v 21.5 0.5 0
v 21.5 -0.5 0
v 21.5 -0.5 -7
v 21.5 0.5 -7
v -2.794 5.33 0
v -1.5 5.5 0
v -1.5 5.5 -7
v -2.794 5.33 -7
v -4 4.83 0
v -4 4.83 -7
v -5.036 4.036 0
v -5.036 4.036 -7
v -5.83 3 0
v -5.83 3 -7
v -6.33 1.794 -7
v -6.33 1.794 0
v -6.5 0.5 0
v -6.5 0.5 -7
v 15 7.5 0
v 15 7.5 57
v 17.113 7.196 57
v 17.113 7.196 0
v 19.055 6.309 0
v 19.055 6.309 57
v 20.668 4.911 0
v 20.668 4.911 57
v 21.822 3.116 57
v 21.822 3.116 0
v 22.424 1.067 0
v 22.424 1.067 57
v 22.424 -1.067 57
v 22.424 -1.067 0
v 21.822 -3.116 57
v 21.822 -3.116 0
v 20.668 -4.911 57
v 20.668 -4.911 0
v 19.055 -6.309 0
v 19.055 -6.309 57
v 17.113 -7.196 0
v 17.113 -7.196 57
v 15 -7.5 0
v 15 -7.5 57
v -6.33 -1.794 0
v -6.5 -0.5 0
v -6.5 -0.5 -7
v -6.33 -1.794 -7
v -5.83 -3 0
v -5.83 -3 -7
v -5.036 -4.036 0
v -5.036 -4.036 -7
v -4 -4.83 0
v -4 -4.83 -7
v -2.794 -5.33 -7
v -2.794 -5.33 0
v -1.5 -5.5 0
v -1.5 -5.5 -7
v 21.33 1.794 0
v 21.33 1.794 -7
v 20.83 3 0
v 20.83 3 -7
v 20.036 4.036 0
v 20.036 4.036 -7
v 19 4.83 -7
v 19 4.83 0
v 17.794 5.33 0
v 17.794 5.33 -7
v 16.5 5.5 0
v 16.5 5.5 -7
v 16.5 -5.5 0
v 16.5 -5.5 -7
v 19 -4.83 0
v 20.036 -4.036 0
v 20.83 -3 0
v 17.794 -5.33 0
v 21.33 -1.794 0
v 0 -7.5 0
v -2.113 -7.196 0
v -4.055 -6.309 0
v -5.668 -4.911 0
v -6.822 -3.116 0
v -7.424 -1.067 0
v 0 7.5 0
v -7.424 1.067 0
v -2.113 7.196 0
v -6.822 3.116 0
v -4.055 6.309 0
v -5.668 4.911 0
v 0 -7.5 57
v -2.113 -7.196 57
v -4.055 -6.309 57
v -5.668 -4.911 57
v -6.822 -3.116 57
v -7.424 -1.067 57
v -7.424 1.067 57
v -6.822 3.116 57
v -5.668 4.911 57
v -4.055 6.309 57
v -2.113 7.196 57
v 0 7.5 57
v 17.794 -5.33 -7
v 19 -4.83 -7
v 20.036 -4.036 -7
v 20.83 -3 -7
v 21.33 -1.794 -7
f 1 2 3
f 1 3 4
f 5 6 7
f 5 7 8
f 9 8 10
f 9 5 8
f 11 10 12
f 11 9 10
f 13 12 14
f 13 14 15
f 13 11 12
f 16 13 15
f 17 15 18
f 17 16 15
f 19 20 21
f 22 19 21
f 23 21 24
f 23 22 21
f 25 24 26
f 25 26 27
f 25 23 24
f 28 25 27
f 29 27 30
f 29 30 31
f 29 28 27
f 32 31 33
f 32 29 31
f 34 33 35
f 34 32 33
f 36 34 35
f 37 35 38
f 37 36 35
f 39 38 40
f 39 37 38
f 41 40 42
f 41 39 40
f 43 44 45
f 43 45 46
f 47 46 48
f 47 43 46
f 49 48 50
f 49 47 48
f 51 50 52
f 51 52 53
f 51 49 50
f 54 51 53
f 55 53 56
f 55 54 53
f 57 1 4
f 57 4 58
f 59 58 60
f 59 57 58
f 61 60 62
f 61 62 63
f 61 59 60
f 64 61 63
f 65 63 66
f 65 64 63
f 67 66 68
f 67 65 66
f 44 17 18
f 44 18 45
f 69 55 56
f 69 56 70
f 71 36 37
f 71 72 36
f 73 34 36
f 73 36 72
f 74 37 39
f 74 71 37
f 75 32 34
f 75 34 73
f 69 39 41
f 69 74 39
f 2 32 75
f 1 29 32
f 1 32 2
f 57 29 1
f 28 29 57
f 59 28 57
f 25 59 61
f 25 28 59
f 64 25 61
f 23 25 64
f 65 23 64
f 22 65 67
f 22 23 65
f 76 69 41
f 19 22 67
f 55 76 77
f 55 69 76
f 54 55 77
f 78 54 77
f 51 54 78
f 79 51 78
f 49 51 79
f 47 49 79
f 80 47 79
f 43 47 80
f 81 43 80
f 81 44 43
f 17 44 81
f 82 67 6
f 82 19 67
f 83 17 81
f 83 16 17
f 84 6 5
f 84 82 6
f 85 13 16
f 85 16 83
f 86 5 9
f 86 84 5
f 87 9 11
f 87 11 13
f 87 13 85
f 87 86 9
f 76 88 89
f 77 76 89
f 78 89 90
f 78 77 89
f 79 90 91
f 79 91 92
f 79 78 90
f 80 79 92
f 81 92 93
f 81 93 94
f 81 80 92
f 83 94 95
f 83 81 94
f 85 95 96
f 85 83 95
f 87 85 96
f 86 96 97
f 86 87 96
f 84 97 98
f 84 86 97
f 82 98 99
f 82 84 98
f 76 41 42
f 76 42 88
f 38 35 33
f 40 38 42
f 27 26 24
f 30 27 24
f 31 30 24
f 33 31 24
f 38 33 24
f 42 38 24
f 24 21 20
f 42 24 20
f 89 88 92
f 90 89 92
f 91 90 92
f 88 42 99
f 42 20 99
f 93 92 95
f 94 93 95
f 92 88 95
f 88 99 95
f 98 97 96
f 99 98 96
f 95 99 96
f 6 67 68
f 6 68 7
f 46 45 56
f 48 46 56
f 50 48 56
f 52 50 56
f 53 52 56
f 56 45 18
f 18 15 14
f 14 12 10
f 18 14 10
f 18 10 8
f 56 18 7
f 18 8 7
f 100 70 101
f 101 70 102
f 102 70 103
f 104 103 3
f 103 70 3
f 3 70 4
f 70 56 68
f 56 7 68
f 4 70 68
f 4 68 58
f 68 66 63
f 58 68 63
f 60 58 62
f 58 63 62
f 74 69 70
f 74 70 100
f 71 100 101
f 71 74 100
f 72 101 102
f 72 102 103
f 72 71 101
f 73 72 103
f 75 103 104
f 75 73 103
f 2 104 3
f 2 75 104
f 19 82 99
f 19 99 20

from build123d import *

# Parameters (mm, degrees)
BOSS_EXTRUDE1_DEPTH = 57
BOSS_EXTRUDE2_DEPTH = 7


with BuildPart() as part:
    # Sketch1 → Boss-Extrude1 (new body)
    with BuildSketch(Plane.XY):
        with BuildLine():
            Line((0, 7.5), (15, 7.5))
            ThreePointArc((15, 7.5), (22.5, 0), (15, -7.5))
            Line((15, -7.5), (0, -7.5))
            ThreePointArc((0, -7.5), (-7.5, 0), (0, 7.5))
        make_face()
    extrude(amount=BOSS_EXTRUDE1_DEPTH)

    # Sketch3 → Boss-Extrude2 (add)
    with BuildSketch(Plane(origin=(0, 0, 0), x_dir=(-1, 0, 0), z_dir=(0, 0, -1))):
        with BuildLine():
            Line((-16.5, 5.5), (1.5, 5.5))
            ThreePointArc((1.5, 5.5), (5.035533906, 4.035533906), (6.5, 0.5))
            Line((6.5, 0.5), (6.5, -0.5))
            ThreePointArc((6.5, -0.5), (5.035533906, -4.035533906), (1.5, -5.5))
            Line((1.5, -5.5), (-16.5, -5.5))
            ThreePointArc((-16.5, -5.5), (-20.035533906, -4.035533906), (-21.5, -0.5))
            Line((-21.5, -0.5), (-21.5, 0.5))
            ThreePointArc((-21.5, 0.5), (-20.035533906, 4.035533906), (-16.5, 5.5))
        make_face()
    extrude(amount=BOSS_EXTRUDE2_DEPTH)


solid = part.part
